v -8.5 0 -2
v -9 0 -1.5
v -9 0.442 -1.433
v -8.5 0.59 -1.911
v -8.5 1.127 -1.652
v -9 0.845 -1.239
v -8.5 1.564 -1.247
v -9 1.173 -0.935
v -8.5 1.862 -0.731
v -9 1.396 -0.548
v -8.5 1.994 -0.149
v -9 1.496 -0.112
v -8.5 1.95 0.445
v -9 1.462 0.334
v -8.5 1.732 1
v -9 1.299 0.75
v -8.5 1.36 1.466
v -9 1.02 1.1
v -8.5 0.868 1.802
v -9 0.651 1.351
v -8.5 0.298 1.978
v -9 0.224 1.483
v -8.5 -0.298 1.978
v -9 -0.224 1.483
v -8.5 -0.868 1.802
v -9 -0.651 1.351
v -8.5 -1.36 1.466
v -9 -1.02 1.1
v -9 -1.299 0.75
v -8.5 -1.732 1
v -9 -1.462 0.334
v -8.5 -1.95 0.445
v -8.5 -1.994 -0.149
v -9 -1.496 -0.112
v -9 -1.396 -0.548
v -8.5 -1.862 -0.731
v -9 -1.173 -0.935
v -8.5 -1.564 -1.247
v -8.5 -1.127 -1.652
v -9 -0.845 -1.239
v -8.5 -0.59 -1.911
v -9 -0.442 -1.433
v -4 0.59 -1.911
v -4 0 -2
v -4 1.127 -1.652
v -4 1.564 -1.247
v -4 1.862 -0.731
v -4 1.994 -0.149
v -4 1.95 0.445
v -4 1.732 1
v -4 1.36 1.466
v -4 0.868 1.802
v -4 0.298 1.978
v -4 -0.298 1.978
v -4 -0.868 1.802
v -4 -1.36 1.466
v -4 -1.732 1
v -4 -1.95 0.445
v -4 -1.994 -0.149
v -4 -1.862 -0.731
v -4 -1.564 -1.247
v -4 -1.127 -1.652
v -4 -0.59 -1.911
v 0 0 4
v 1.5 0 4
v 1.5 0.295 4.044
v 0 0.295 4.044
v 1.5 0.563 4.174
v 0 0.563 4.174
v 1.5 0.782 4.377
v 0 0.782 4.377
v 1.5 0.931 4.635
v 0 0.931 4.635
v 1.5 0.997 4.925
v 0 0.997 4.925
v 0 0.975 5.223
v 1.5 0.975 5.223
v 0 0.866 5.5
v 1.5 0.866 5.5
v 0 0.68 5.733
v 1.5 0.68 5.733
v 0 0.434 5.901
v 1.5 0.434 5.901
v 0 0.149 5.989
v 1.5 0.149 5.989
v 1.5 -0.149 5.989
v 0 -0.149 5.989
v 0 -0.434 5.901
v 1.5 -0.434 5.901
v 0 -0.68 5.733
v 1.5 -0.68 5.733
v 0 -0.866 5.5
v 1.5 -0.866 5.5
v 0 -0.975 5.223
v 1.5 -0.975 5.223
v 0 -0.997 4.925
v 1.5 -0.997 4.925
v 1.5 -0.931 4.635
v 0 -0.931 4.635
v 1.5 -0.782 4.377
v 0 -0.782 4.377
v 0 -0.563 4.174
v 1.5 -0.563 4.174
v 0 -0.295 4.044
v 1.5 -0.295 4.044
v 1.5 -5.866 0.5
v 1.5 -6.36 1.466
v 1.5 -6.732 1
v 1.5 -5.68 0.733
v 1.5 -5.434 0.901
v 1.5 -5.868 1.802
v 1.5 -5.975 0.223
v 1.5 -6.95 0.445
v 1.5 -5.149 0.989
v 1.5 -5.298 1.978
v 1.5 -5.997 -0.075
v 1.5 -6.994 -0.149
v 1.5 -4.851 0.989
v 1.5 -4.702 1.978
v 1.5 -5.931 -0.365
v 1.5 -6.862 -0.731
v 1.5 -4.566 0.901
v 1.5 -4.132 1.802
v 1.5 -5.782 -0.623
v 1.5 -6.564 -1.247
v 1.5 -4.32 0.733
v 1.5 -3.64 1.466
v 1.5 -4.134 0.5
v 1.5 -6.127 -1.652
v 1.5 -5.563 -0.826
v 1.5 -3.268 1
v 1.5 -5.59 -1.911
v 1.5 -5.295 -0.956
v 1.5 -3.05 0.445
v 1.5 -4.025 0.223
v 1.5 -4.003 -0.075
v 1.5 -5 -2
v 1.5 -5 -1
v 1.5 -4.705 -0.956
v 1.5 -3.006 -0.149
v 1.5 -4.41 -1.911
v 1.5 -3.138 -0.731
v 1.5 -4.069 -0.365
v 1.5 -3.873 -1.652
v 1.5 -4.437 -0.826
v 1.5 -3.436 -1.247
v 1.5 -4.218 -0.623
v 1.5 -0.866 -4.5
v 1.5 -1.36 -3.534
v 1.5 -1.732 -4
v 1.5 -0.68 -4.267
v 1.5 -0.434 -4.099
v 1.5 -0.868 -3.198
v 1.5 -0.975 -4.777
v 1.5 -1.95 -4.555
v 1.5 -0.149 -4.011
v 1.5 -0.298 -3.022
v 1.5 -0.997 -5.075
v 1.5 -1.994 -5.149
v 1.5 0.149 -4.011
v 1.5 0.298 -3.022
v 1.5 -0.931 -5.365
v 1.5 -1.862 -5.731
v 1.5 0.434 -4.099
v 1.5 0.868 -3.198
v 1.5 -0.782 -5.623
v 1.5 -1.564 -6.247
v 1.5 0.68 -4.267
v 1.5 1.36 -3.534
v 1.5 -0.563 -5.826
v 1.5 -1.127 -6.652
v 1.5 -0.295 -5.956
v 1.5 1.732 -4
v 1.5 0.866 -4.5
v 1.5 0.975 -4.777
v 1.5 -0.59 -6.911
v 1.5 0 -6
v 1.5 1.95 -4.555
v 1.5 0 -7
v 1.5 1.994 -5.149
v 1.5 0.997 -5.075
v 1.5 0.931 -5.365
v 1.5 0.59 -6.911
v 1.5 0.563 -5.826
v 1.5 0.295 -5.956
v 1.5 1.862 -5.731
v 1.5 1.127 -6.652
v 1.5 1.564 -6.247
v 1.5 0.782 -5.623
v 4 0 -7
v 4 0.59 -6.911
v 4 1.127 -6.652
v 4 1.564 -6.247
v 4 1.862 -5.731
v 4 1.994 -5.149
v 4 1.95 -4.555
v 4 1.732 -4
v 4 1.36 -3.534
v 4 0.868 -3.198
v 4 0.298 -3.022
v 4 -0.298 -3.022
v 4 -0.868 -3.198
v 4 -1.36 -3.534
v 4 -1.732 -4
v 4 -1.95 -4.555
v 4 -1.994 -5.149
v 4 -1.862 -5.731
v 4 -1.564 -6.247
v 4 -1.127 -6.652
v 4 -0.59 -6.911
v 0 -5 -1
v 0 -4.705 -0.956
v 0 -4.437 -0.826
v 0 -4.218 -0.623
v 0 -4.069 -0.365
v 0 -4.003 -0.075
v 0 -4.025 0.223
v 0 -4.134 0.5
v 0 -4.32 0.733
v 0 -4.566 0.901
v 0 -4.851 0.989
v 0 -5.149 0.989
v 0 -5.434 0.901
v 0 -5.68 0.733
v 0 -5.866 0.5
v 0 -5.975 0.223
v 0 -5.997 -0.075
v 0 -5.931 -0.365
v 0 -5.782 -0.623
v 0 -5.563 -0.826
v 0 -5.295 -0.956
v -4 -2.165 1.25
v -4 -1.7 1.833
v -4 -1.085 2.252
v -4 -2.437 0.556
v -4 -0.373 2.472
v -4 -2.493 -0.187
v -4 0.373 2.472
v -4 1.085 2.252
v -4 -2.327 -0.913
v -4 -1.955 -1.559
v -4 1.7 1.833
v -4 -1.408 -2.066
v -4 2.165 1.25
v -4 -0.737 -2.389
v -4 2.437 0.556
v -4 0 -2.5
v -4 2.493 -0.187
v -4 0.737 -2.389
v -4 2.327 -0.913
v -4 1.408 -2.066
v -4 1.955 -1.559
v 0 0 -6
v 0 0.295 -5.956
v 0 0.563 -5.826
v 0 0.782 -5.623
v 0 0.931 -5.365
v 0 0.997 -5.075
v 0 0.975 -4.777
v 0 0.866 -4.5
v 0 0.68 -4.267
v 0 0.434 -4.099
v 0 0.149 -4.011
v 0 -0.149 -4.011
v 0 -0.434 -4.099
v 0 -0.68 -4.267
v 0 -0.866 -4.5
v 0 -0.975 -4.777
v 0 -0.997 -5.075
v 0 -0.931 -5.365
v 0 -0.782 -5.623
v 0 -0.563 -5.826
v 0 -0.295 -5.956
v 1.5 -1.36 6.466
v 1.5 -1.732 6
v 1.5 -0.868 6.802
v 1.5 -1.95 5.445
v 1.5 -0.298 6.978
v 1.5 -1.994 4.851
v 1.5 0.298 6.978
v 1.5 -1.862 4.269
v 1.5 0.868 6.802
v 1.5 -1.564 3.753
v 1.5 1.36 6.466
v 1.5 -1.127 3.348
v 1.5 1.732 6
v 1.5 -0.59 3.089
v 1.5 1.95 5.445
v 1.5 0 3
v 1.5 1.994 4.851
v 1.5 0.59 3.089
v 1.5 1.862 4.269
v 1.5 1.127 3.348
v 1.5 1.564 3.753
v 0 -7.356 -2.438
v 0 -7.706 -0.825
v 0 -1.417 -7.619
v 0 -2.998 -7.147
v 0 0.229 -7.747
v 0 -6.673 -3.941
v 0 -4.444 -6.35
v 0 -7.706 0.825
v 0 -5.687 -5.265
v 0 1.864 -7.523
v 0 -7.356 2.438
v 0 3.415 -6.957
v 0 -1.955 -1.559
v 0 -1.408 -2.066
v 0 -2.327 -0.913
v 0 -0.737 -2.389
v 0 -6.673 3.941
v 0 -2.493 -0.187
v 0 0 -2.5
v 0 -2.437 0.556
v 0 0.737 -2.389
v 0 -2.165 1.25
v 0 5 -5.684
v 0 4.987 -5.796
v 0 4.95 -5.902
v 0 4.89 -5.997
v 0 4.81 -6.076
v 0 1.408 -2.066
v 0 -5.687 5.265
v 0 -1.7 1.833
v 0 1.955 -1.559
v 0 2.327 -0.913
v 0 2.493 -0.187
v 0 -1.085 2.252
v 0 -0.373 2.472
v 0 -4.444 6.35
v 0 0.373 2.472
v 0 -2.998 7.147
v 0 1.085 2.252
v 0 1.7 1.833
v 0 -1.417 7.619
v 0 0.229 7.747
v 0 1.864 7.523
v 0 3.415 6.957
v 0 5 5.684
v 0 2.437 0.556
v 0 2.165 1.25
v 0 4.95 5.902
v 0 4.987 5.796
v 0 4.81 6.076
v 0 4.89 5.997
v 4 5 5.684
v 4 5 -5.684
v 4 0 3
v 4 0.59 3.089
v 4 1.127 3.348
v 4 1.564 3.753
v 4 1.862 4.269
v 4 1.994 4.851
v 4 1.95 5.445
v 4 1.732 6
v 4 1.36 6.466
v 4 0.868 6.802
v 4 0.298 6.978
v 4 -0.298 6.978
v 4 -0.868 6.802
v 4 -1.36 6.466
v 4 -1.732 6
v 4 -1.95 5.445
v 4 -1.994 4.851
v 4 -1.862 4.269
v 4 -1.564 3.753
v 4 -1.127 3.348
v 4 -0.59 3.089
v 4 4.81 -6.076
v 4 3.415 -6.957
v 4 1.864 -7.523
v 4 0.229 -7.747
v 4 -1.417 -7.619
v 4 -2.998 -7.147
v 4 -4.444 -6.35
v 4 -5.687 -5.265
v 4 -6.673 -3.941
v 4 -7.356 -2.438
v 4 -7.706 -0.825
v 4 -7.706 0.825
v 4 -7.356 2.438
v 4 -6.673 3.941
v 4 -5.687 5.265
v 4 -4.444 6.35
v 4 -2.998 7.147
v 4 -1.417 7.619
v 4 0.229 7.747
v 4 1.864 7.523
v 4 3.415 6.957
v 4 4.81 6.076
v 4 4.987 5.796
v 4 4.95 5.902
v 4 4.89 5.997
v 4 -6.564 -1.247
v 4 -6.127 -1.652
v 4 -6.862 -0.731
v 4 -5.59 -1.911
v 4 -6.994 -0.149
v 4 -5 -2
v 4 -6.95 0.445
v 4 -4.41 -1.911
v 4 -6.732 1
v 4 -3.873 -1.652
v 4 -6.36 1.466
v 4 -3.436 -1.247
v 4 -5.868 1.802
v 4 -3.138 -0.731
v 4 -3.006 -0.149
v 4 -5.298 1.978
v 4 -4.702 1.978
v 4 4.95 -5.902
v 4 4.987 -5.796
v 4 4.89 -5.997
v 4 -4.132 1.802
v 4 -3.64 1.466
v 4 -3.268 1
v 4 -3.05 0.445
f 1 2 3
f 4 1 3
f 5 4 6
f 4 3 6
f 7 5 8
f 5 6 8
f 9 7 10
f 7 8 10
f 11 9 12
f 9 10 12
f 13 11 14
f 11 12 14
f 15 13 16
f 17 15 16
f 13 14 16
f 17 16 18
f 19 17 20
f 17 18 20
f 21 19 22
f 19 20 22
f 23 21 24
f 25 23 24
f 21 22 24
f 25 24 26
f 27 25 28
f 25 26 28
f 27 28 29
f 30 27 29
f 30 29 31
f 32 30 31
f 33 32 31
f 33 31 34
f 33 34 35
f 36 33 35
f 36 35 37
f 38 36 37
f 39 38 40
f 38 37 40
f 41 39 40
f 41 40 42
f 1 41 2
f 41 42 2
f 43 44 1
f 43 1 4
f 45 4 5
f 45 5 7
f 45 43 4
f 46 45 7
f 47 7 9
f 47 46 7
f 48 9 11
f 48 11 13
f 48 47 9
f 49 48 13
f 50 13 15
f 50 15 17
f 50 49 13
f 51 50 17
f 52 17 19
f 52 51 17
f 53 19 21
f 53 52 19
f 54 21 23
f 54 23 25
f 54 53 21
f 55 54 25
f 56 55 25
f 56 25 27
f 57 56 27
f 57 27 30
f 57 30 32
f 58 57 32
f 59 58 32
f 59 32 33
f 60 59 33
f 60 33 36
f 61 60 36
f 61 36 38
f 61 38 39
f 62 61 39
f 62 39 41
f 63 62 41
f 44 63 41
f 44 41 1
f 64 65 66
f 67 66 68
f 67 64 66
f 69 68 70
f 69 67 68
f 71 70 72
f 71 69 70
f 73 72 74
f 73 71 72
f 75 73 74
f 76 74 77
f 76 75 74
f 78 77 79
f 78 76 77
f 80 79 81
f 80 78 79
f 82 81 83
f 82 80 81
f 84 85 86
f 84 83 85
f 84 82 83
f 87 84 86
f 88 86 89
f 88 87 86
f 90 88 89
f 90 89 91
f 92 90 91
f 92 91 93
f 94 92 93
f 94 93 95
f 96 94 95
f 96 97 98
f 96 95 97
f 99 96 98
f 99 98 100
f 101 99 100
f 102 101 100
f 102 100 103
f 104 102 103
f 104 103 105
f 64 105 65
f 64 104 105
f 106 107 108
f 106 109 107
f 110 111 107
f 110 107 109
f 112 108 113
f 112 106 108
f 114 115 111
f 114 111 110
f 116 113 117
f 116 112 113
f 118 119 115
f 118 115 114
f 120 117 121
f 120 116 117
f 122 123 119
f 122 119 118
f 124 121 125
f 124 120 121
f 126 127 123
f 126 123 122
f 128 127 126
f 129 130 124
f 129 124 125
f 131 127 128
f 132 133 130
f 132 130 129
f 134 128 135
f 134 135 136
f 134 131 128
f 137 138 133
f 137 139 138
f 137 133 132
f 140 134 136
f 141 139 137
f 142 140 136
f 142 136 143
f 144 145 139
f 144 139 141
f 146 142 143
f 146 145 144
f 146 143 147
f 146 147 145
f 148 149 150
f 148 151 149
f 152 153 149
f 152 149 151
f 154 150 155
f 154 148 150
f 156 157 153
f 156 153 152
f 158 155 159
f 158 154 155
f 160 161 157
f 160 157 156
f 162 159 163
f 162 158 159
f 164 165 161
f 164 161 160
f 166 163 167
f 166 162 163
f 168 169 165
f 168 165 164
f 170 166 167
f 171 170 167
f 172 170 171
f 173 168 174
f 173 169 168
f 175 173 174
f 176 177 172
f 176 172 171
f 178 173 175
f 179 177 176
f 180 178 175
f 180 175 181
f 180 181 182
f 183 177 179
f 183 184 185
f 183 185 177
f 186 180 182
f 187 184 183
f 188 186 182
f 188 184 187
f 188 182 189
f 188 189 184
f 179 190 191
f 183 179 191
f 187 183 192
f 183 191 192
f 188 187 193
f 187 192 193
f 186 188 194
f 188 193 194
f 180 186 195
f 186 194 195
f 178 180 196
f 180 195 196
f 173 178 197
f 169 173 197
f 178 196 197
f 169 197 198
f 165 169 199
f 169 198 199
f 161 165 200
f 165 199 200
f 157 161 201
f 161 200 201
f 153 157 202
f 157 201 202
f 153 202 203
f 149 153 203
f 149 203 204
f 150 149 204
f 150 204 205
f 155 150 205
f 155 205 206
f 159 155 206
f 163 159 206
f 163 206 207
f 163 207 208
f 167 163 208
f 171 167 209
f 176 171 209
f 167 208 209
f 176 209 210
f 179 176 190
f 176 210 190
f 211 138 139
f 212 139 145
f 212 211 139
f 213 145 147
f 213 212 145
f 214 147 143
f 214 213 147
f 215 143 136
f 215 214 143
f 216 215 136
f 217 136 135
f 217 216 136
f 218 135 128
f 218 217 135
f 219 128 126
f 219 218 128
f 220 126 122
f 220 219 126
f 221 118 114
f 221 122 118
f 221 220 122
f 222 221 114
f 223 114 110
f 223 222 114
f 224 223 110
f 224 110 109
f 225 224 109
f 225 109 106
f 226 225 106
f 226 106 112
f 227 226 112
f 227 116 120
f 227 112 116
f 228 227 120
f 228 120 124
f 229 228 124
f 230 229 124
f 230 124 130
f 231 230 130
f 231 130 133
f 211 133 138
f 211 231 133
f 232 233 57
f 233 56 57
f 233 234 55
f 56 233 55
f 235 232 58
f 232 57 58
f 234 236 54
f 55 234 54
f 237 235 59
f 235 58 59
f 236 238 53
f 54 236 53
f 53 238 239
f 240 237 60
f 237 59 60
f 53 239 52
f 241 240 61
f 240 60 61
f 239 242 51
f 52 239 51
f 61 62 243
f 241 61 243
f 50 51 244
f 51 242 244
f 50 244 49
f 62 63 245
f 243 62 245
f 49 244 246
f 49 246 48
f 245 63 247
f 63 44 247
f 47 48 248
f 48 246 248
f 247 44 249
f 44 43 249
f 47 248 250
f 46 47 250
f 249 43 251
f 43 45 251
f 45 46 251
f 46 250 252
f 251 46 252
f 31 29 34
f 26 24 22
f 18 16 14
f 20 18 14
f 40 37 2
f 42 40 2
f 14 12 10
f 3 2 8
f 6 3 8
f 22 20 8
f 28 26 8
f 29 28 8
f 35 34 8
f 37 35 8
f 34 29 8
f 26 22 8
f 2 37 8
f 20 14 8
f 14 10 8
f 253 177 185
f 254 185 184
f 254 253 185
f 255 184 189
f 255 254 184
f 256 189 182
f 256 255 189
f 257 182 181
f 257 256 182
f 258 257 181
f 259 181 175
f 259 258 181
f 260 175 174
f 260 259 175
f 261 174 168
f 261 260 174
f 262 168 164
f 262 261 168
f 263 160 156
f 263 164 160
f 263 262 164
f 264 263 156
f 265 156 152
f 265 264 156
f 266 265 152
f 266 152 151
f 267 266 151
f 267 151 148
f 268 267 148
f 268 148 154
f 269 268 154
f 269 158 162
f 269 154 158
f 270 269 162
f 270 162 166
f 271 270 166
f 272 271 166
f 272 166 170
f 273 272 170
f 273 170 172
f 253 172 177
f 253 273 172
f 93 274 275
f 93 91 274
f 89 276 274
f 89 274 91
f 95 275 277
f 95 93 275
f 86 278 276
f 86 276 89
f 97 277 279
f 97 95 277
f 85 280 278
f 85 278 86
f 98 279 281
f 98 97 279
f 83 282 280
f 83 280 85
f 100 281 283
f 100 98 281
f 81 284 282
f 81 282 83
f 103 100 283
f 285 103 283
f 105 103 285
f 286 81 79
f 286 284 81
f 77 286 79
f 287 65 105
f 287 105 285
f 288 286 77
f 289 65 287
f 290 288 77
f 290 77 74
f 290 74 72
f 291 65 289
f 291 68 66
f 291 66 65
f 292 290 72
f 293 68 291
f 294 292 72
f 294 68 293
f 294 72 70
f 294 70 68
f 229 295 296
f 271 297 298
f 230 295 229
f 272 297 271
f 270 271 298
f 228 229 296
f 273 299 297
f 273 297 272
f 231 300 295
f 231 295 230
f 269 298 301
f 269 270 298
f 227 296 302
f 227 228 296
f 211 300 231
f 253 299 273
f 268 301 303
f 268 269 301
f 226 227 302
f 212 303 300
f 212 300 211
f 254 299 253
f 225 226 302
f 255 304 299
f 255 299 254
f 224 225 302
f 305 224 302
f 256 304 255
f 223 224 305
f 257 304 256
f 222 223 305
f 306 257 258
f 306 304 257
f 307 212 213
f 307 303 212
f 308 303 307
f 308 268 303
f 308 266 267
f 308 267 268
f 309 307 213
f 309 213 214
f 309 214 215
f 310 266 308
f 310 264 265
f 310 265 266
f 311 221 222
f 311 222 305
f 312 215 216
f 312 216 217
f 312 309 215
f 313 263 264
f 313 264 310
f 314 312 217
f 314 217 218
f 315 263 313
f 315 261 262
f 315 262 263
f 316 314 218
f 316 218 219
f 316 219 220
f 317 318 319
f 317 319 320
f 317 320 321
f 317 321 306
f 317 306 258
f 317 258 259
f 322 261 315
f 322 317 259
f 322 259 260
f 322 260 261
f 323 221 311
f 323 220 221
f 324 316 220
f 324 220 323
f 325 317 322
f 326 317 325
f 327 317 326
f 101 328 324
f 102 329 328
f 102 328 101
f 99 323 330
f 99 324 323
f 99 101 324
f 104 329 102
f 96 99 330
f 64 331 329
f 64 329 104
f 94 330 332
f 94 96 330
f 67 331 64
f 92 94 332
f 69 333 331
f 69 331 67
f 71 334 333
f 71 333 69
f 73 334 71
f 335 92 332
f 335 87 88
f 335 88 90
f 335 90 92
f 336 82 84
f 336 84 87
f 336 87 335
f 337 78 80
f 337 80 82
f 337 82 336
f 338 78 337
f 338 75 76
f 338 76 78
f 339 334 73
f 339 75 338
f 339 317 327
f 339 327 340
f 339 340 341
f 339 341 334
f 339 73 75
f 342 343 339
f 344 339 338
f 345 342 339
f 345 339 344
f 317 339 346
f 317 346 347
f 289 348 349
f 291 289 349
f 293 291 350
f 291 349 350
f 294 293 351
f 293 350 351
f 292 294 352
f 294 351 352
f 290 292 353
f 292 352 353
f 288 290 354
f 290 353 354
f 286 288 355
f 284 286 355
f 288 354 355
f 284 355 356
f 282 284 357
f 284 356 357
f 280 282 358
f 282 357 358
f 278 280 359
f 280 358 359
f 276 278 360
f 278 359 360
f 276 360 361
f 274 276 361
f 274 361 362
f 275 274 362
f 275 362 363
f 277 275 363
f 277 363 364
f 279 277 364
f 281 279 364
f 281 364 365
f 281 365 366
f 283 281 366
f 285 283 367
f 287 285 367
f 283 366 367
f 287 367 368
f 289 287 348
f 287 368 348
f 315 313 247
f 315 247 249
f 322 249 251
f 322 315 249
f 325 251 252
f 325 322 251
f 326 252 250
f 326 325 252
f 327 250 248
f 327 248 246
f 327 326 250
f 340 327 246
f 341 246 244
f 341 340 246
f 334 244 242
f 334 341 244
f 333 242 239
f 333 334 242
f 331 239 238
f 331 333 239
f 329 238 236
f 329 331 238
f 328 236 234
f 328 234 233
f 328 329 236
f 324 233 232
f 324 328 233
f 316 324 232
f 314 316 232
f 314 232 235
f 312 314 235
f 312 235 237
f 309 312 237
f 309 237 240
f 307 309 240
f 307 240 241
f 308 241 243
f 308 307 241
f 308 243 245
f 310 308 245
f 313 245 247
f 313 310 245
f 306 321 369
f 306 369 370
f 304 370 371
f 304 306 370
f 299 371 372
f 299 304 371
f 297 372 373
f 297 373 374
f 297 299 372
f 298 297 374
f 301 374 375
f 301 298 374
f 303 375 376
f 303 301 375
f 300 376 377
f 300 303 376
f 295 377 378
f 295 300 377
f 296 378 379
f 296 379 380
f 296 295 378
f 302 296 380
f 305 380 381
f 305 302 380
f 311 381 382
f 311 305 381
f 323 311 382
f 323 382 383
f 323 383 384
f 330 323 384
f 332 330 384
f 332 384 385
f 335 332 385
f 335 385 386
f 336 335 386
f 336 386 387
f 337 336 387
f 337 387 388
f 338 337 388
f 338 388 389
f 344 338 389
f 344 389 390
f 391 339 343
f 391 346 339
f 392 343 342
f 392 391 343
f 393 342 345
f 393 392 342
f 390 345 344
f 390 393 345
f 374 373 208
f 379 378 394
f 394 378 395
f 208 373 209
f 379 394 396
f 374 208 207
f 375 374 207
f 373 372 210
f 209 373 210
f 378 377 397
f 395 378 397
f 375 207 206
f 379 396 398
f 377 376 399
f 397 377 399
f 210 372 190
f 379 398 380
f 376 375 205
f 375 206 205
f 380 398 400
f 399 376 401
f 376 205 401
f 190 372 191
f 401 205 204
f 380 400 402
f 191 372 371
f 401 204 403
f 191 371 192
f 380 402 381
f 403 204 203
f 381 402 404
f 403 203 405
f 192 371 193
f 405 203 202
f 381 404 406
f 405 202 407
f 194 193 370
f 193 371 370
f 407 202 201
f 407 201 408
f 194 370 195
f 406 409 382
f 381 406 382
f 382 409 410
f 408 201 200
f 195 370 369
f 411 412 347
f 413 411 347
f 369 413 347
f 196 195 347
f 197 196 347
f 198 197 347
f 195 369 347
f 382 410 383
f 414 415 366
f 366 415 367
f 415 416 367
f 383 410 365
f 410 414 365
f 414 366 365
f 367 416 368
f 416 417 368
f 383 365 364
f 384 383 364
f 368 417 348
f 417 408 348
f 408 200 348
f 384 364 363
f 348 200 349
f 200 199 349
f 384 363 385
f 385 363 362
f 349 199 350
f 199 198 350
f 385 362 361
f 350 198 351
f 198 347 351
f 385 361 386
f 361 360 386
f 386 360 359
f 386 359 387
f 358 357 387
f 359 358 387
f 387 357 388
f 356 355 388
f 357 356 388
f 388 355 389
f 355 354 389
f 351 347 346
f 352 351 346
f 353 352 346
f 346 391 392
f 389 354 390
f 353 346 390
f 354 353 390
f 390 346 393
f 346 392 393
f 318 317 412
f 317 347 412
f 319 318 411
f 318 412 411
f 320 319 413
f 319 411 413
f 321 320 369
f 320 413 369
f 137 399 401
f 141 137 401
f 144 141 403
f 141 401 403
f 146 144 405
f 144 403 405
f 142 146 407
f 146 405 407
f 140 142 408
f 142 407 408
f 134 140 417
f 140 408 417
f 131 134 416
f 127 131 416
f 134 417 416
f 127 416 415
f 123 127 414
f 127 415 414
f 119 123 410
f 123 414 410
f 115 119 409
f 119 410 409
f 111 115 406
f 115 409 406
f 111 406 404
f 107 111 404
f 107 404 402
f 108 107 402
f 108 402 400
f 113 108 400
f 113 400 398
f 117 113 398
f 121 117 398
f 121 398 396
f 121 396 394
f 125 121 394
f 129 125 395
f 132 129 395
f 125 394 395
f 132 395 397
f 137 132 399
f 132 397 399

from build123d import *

# Parameters (mm, degrees)
BOSS_EXTRUDE1_DEPTH = 4
SKETCH1_3_R         = 1
CUT_EXTRUDE2_DEPTH  = 4
SKETCH1_4_R         = 2.5
BOSS_EXTRUDE2_DEPTH = 4
SKETCH1_5_R         = 2
BOSS_EXTRUDE3_DEPTH = 9
CHAMFER1_SIZE       = 0.5
FILLET1_R           = 0.5
SKETCH2_R           = 2
CUT_EXTRUDE3_DEPTH  = 2.5


with BuildPart() as part:
    # Sketch1 → Boss-Extrude1 (new body)
    with BuildSketch(Plane(origin=(0, 0, 0), x_dir=(0, 0, -1), z_dir=(1, 0, 0))):
        with BuildLine():
            Line((-5.921359641, 5), (5.921359641, 5))
            ThreePointArc((5.921359641, 5), (0, -7.75), (-5.921359641, 5))
        make_face()
    extrude(amount=BOSS_EXTRUDE1_DEPTH)

    # Sketch1<3> → Cut-Extrude2 (cut)
    with BuildSketch(Plane(origin=(0, 0, 0), x_dir=(0, 0, -1), z_dir=(1, 0, 0))):
        with Locations((-5, 0)):
            Circle(SKETCH1_3_R)
        with Locations((5, 0)):
            Circle(SKETCH1_3_R)
        with Locations((0, -5)):
            Circle(SKETCH1_3_R)
    extrude(amount=CUT_EXTRUDE2_DEPTH, mode=Mode.SUBTRACT)

    # Sketch1<4> → Boss-Extrude2 (add)
    with BuildSketch(Plane(origin=(0, 0, 0), x_dir=(0, 0, -1), z_dir=(1, 0, 0))):
        Circle(SKETCH1_4_R)
    extrude(amount=-BOSS_EXTRUDE2_DEPTH)

    # Sketch1<5> → Boss-Extrude3 (add)
    with BuildSketch(Plane(origin=(0, 0, 0), x_dir=(0, 0, -1), z_dir=(1, 0, 0))):
        Circle(SKETCH1_5_R)
    extrude(amount=-BOSS_EXTRUDE3_DEPTH)

    # Chamfer1
    chamfer1_edges = [part.edges().sort_by_distance(p)[0] for p in [
        (-9, 0, 2),
    ]]
    chamfer(chamfer1_edges, length=CHAMFER1_SIZE)

    # Fillet1
    fillet1_edges = [part.edges().sort_by_distance(p)[0] for p in [
        (2, 5, 5.921359641),
        (2, 5, -5.921359641),
    ]]
    fillet(fillet1_edges, radius=FILLET1_R)

    # Sketch2 → Cut-Extrude3 (cut)
    with BuildSketch(Plane(origin=(4, 0, 0), x_dir=(0, 0, -1), z_dir=(1, 0, 0))):
        with Locations((-5, 0)):
            Circle(SKETCH2_R)
        with Locations((5, 0)):
            Circle(SKETCH2_R)
        with Locations((0, -5)):
            Circle(SKETCH2_R)
    extrude(amount=-CUT_EXTRUDE3_DEPTH, mode=Mode.SUBTRACT)


solid = part.part
